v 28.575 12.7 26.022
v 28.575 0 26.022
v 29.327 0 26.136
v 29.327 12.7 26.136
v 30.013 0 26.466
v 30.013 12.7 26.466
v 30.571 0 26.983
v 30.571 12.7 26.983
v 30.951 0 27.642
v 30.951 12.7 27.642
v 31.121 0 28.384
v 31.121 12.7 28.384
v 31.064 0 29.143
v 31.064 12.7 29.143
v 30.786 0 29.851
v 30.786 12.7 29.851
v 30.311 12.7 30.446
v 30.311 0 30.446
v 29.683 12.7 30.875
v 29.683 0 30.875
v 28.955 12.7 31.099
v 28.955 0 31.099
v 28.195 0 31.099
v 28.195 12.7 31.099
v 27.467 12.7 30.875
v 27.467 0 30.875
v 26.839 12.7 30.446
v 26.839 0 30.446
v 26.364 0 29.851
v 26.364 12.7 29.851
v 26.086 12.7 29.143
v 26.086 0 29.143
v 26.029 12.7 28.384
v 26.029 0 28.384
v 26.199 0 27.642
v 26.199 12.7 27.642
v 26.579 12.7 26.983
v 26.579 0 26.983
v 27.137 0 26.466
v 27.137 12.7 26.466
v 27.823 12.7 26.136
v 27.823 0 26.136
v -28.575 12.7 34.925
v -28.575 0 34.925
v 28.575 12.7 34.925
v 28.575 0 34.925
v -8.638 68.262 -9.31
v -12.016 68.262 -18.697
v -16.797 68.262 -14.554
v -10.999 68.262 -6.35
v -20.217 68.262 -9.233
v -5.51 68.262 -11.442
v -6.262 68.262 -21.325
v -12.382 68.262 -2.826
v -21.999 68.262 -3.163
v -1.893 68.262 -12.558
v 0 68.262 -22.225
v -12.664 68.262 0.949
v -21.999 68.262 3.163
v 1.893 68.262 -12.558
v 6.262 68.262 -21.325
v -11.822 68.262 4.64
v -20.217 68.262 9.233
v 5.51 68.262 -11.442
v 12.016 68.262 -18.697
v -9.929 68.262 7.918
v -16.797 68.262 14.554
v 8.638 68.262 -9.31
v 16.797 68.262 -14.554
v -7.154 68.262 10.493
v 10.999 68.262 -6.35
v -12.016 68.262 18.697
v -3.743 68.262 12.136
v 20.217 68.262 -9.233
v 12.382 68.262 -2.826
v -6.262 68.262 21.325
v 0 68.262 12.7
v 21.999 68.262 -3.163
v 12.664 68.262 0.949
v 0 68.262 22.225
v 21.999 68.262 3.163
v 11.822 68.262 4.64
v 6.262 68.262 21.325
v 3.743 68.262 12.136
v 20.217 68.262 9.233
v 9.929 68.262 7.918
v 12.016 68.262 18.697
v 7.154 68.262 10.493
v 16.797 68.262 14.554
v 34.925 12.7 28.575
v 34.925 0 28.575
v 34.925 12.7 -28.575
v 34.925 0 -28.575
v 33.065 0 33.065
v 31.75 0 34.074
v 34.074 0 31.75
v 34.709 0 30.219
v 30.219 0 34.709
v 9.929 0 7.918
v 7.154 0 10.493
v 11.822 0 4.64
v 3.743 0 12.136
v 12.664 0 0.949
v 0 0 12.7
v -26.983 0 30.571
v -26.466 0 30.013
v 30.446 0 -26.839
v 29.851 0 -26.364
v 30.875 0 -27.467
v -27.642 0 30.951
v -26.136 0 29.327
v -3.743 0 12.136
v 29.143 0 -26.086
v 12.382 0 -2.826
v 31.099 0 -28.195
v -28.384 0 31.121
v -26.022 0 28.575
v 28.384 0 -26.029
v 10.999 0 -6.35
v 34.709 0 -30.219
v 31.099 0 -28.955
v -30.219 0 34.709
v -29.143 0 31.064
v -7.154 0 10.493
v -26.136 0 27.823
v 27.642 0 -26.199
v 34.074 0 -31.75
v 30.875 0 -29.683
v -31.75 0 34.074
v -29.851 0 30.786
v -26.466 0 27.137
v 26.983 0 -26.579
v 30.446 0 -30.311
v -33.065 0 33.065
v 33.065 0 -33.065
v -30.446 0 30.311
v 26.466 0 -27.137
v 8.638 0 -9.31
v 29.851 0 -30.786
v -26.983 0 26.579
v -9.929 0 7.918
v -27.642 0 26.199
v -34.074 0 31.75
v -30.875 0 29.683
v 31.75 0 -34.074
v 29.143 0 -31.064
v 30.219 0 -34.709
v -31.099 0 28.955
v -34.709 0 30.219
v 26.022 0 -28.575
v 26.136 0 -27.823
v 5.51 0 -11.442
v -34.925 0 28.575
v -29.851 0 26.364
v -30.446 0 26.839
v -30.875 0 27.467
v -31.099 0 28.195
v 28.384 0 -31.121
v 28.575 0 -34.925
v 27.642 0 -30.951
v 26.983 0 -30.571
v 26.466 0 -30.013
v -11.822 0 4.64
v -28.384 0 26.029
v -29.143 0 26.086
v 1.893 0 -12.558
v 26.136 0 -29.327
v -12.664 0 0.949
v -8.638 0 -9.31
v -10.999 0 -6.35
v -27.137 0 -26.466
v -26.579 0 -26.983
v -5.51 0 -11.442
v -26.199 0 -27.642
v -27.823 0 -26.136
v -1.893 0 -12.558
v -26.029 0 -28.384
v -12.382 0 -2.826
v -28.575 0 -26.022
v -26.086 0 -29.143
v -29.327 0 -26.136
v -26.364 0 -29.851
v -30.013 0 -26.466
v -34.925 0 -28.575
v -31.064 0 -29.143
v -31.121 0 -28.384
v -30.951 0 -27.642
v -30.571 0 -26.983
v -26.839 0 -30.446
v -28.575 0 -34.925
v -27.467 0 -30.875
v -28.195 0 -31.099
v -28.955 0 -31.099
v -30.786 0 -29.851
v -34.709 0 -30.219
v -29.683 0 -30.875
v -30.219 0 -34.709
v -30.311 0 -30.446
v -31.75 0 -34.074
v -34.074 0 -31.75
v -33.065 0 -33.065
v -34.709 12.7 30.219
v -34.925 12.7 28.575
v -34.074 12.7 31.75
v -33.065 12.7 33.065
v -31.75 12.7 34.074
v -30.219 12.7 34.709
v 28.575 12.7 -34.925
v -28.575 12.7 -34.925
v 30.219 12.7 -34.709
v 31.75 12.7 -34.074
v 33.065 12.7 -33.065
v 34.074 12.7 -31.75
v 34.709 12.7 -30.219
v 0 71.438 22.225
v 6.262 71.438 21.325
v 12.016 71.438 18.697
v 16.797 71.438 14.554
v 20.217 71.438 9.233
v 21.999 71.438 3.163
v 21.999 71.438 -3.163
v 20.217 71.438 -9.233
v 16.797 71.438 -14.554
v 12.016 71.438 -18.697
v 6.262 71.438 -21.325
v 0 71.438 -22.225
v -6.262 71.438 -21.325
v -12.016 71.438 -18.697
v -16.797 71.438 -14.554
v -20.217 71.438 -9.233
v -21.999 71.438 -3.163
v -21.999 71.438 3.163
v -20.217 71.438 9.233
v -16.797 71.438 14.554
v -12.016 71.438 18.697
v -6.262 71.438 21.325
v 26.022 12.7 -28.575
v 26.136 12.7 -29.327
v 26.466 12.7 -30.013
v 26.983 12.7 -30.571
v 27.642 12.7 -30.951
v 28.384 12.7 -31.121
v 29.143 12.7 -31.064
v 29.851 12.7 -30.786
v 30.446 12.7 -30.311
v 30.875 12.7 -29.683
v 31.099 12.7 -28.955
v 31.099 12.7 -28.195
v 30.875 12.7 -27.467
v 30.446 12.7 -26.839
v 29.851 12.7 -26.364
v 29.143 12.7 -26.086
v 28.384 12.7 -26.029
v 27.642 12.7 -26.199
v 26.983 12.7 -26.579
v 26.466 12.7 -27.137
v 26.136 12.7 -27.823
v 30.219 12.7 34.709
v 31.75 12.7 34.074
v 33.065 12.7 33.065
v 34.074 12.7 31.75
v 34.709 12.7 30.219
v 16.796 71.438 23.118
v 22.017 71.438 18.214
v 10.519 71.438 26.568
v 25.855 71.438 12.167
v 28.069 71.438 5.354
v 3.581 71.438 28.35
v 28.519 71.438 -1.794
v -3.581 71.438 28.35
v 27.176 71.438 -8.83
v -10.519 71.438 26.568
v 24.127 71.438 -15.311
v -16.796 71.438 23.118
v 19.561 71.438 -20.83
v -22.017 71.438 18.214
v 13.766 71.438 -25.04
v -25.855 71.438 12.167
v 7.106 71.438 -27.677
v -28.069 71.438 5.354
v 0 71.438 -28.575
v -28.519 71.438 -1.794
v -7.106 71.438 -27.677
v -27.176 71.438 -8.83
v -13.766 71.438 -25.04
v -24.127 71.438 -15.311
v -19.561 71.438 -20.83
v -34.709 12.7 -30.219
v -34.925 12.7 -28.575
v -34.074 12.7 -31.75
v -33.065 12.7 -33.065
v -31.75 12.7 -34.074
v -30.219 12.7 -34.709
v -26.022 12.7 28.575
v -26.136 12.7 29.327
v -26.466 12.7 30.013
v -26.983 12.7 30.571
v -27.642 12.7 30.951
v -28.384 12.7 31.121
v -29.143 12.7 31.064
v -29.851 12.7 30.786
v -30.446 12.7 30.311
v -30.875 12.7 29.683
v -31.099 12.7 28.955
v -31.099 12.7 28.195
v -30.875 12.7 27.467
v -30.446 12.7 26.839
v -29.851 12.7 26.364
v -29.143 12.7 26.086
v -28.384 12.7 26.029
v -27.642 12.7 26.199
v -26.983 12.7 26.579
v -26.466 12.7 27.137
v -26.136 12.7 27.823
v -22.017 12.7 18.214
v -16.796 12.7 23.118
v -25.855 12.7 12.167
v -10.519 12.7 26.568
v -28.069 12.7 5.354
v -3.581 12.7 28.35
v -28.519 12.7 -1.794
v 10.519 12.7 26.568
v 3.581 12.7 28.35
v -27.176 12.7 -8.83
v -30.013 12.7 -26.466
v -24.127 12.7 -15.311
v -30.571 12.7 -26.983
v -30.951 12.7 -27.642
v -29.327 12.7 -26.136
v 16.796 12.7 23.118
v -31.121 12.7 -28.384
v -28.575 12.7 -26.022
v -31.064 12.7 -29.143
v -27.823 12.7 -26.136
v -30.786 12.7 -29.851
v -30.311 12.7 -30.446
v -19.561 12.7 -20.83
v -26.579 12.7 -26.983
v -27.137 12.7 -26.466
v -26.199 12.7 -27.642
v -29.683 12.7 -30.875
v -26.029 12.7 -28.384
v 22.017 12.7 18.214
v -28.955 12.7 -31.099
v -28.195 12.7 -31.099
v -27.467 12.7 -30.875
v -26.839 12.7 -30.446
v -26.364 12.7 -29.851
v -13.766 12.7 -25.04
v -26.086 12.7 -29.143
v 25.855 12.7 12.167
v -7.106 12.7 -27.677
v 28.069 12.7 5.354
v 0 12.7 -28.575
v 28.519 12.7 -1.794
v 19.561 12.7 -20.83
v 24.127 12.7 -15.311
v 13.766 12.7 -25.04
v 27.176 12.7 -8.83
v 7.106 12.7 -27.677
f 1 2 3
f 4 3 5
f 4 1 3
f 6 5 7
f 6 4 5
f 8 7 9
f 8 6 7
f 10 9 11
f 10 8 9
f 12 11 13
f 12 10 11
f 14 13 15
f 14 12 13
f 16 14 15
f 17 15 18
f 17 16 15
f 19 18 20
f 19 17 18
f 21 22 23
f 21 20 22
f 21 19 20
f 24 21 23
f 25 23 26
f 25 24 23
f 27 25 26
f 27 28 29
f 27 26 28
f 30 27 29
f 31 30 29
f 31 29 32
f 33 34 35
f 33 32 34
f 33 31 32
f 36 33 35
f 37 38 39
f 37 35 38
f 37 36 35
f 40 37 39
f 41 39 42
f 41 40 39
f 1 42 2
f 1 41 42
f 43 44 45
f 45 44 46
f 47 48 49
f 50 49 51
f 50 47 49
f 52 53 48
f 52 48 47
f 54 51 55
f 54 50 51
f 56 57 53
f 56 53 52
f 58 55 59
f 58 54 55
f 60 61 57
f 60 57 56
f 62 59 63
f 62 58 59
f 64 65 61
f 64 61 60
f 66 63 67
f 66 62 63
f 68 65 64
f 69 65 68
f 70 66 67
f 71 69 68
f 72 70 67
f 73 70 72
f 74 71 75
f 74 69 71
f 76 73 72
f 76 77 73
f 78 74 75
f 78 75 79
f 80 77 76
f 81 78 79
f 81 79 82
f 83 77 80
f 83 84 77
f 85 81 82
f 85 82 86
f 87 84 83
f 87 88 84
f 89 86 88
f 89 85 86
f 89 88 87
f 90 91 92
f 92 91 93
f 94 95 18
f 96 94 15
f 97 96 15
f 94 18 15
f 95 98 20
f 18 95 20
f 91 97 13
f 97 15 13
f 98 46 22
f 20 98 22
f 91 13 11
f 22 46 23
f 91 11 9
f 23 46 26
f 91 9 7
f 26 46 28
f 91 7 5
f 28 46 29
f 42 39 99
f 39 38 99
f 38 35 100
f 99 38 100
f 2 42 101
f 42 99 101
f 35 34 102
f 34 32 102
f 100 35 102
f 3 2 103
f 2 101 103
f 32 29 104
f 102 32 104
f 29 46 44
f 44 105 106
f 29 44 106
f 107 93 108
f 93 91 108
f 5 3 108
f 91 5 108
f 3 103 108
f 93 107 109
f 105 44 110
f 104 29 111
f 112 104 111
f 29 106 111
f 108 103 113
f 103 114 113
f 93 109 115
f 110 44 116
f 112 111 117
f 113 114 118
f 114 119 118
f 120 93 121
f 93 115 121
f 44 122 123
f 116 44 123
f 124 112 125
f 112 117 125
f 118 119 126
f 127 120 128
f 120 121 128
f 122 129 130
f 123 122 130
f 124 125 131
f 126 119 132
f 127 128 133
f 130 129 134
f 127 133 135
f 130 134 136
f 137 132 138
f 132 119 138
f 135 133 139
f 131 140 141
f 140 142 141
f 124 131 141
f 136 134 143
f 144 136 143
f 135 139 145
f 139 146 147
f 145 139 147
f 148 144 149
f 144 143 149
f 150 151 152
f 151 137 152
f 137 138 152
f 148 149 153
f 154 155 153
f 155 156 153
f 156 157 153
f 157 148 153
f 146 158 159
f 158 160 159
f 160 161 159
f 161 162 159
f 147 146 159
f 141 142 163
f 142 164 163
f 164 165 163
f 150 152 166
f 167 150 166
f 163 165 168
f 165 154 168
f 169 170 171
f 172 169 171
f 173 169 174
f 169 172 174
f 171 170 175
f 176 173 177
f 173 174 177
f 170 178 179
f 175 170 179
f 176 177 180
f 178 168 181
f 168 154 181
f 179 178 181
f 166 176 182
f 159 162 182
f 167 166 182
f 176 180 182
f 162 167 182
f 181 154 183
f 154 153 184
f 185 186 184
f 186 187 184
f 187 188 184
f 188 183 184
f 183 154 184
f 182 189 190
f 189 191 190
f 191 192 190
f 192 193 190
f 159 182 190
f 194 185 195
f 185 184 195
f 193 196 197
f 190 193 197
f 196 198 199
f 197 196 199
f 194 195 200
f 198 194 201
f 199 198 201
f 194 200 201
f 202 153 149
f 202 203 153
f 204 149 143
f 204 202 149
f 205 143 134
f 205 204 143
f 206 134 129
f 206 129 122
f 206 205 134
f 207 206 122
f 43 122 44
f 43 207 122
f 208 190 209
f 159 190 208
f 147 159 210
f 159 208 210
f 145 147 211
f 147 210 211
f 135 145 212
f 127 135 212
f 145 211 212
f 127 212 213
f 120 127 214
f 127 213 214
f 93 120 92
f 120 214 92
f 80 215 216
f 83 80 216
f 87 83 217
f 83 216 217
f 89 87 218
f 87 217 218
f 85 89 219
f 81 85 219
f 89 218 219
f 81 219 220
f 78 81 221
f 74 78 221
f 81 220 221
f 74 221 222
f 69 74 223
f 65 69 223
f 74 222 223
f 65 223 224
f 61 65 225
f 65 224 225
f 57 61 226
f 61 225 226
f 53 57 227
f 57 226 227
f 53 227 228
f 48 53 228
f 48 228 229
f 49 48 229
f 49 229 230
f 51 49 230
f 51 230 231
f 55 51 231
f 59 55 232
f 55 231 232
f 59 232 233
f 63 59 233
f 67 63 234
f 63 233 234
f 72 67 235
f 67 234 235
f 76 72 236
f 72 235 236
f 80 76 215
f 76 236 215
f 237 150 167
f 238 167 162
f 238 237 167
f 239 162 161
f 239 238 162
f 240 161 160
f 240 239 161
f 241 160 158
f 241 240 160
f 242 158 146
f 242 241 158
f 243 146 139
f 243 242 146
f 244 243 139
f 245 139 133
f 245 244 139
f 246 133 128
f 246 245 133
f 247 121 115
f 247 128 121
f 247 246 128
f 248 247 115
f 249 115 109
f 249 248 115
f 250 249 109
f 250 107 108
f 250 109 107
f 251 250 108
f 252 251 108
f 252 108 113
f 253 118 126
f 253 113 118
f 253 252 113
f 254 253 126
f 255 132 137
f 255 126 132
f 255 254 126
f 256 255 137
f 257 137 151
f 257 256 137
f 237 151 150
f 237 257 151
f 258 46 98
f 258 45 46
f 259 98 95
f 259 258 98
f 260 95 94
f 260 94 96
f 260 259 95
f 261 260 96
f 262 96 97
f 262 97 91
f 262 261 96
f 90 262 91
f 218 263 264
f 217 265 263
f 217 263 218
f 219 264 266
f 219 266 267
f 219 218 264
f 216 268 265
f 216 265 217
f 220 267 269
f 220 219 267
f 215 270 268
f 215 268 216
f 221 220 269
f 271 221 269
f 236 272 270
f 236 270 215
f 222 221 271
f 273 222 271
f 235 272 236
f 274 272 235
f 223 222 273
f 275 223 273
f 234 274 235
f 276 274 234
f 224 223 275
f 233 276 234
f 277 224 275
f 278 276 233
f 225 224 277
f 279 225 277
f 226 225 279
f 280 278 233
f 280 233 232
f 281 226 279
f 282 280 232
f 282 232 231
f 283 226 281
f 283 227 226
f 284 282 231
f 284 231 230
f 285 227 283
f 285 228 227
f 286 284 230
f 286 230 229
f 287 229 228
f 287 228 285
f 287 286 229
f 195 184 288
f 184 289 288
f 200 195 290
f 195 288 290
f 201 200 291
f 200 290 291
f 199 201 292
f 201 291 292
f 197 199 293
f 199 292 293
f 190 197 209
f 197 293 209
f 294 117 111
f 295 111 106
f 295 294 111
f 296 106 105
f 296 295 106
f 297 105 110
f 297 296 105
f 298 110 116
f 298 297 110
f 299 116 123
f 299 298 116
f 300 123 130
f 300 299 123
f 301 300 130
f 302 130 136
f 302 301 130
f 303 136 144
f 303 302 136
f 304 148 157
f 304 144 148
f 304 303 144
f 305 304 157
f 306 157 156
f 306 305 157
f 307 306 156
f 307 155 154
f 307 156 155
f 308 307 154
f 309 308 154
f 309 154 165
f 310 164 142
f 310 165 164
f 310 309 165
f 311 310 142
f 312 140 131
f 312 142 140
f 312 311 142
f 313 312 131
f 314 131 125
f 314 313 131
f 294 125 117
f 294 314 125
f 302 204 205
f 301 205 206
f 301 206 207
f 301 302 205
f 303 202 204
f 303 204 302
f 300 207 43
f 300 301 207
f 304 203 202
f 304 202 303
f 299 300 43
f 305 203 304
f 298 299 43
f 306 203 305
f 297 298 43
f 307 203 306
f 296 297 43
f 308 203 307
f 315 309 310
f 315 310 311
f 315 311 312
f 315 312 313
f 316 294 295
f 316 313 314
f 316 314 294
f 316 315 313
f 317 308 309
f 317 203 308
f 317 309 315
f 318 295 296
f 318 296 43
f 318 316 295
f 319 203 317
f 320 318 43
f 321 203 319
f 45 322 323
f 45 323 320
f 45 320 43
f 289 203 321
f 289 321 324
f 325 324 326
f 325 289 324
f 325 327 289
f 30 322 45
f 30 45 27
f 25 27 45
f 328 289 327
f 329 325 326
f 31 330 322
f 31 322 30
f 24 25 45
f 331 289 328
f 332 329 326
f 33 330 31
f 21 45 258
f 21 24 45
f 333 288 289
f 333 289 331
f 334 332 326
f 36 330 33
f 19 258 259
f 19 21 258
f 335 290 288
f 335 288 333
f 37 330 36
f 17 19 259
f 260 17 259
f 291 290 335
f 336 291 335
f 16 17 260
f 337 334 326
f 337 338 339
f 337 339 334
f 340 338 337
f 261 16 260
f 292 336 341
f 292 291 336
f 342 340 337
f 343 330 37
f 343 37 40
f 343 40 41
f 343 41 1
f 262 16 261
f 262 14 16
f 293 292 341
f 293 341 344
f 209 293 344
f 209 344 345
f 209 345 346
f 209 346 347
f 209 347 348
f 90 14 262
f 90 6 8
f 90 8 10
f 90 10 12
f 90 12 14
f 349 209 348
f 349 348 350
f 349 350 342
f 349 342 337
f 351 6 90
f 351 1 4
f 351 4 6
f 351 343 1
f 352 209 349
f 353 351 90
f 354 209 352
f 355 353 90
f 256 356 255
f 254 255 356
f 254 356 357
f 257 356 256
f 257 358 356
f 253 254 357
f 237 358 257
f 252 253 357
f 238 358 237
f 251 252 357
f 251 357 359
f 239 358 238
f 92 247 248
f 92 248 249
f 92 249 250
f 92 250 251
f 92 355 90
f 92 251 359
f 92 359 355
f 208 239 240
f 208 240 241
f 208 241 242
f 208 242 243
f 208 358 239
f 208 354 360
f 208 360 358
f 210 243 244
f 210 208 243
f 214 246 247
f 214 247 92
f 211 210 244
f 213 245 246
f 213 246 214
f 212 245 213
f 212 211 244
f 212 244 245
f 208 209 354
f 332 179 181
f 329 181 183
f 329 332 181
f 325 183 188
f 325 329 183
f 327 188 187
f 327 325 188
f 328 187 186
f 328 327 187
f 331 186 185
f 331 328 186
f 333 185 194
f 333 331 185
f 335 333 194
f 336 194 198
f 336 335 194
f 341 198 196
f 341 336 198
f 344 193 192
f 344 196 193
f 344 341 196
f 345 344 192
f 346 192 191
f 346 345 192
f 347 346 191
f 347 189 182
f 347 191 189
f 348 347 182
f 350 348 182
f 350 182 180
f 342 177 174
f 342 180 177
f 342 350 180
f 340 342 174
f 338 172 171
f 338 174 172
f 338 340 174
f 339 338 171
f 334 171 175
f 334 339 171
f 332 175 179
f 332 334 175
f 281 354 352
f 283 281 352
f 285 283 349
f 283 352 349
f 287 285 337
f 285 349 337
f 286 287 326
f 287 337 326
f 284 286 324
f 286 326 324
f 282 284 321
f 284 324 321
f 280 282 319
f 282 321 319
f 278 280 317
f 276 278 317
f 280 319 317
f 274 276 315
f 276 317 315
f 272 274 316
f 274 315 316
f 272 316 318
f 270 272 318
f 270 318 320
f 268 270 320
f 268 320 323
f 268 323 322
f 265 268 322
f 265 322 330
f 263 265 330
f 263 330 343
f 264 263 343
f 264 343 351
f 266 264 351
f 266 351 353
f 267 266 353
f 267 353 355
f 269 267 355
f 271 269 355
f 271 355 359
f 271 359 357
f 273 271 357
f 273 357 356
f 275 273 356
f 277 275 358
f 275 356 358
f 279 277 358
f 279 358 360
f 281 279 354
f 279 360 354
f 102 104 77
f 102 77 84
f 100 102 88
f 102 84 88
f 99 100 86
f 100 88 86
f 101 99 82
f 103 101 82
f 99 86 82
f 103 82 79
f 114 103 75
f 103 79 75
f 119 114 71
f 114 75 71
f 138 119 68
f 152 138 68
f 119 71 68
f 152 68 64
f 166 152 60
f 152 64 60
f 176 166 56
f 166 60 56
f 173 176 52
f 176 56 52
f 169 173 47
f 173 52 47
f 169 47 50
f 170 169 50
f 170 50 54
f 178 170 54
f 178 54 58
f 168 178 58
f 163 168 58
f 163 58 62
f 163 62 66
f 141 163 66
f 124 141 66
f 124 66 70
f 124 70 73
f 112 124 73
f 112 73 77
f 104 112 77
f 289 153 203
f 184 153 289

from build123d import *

# Parameters (mm, degrees)
SKETCH1_W           = 69.85
SKETCH1_H           = 69.85
BASE_EXTRUDE_DEPTH  = 12.7
SKETCH2_R           = 28.575
BOSS_EXTRUDE1_DEPTH = 71.4375
SKETCH3_R           = 12.7
CUT_EXTRUDE1_DEPTH  = 87.849453978
SKETCH4_R           = 22.225
CUT_EXTRUDE2_DEPTH  = 3.175
FILLET1_R           = 6.35
CIRPATTERN2_COUNT   = 4


with BuildPart() as part:
    # Sketch1 → Base-Extrude (new body)
    with BuildSketch(Plane(origin=(0, 0, 0), x_dir=(1, 0, 0), z_dir=(0, 1, 0))):
        Rectangle(SKETCH1_W, SKETCH1_H)
    extrude(amount=BASE_EXTRUDE_DEPTH)

    # Sketch2 → Boss-Extrude1 (add)
    with BuildSketch(Plane(origin=(0, 0, 0), x_dir=(-1, 0, 0), z_dir=(0, 1, 0))):
        with Locations(Location((0, 0, 0), (0, 0, 270))):
            Circle(SKETCH2_R)
    extrude(amount=BOSS_EXTRUDE1_DEPTH)

    # Sketch3 → Cut-Extrude1 (cut, through all)
    with BuildSketch(Plane(origin=(0, 71.4375, 0), x_dir=(-1, 0, 0), z_dir=(0, 1, 0))):
        with Locations(Location((0, 0, 0), (0, 0, 90))):
            Circle(SKETCH3_R)
    extrude(amount=-CUT_EXTRUDE1_DEPTH, mode=Mode.SUBTRACT)

    # Sketch4 → Cut-Extrude2 (cut)
    with BuildSketch(Plane(origin=(0, 71.4375, 0), x_dir=(-1, 0, 0), z_dir=(0, 1, 0))):
        with Locations(Location((0, 0, 0), (0, 0, 90))):
            Circle(SKETCH4_R)
    extrude(amount=-CUT_EXTRUDE2_DEPTH, mode=Mode.SUBTRACT)

    # Fillet1
    fillet1_edges = [part.edges().sort_by_distance(p)[0] for p in [
        (-34.925, 6.35, 34.925),
        (34.925, 6.35, 34.925),
        (34.925, 6.35, -34.925),
        (-34.925, 6.35, -34.925),
    ]]
    fillet(fillet1_edges, radius=FILLET1_R)

    # Sketch7 → 1/4-20 Tapped Hole2 (revolve, cut)
    with BuildSketch(Plane(origin=(-28.575, 12.7, -28.575), x_dir=(0, 0, 1), z_dir=(1, 0, 0))):
        Polygon((0, 0), (0, 20.583816902), (2.5527, 19.05), (2.5527, 0), align=None)
    f_1_4_20_tapped_hole2 = revolve(axis=Axis((-28.575, 19.05, -28.575), (0, -1, 0)), mode=Mode.SUBTRACT)

    # CirPattern2: 1/4-20 Tapped Hole2 ×4 about axis
    cirpattern2_axis = Axis((0, 0, 0), (0, 1, 0))
    for i in range(1, CIRPATTERN2_COUNT):
        add(f_1_4_20_tapped_hole2.rotate(cirpattern2_axis, i * 360 / CIRPATTERN2_COUNT), mode=Mode.SUBTRACT)


solid = part.part
